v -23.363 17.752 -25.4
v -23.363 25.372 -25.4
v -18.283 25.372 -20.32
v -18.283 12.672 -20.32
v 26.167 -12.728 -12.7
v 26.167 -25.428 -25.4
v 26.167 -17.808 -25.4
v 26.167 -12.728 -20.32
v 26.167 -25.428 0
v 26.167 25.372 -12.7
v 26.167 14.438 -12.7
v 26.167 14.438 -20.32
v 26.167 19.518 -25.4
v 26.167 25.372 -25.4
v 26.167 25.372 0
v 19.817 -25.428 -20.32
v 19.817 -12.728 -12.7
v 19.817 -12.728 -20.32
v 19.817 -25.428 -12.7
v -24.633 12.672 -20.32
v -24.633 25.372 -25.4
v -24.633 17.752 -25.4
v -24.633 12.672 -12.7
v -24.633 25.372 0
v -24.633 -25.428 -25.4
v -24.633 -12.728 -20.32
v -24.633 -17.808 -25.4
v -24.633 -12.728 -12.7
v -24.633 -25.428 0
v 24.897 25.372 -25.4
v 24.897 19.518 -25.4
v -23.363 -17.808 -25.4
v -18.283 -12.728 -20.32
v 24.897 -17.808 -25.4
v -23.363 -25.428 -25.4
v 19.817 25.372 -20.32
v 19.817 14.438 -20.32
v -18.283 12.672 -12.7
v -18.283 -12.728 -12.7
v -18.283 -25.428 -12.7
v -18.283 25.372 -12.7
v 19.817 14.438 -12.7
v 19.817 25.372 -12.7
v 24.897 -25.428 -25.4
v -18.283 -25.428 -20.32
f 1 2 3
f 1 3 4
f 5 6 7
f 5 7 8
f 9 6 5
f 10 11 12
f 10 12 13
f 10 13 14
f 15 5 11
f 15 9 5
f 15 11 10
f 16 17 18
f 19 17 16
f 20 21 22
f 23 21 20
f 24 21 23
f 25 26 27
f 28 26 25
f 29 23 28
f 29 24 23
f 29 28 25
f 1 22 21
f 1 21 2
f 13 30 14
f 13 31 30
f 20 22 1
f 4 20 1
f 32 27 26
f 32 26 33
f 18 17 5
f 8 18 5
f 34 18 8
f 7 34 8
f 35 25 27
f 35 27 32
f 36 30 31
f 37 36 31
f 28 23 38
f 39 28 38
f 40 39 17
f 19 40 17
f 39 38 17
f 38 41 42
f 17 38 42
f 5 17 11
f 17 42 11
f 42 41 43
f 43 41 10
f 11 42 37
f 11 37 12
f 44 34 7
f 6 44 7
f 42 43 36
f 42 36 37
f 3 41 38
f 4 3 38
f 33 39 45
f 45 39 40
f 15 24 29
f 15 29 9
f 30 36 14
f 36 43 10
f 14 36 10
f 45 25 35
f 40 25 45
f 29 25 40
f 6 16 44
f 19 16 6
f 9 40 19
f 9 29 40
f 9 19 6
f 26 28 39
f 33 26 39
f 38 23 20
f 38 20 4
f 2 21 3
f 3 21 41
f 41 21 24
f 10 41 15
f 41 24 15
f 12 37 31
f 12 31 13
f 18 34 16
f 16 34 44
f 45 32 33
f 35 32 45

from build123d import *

# Parameters (mm, degrees)
F0_W     = 50.8
F0_H     = 50.8
F1_DEPTH = 12.7
F2_W     = 6.35
F2_H     = 12.7
F2_H_2   = 10.934927
F3_DEPTH = 12.7
F4_SIZE  = 5.08


with BuildPart() as f1:
    # F0 (on Top) → F1 (new body)
    with BuildSketch(Plane.XY):
        with Locations((0.767379, -0.027555)):
            Rectangle(F0_W, F0_H)
    extrude(amount=-F1_DEPTH)

    # F2 (on face) → F3 (join)
    with BuildSketch(Plane(origin=(0, 0, -12.7), x_dir=(1, 0, 0), z_dir=(0, 0, -1))):
        with Locations((-21.457621, 19.077555)):
            Rectangle(F2_W, F2_H)
        with Locations((22.992379, 19.077555)):
            Rectangle(F2_W, F2_H)
        with Locations((-21.457621, -19.022445)):
            Rectangle(F2_W, F2_H)
        with Locations((22.992379, -19.904981)):
            Rectangle(F2_W, F2_H_2)
    extrude(amount=F3_DEPTH)

    # F4
    f4_edges = [f1.edges().sort_by_distance(p)[0] for p in [
        (-21.457621, -12.727555, -25.4),
        (-18.282621, -19.077555, -25.4),
        (19.817379, -19.077555, -25.4),
        (22.992379, -12.727555, -25.4),
        (-18.282621, 19.022445, -25.4),
        (-21.457621, 12.672445, -25.4),
        (22.992379, 14.437518, -25.4),
        (19.817379, 19.904981, -25.4),
    ]]
    chamfer(f4_edges, length=F4_SIZE)


solid = f1.part
